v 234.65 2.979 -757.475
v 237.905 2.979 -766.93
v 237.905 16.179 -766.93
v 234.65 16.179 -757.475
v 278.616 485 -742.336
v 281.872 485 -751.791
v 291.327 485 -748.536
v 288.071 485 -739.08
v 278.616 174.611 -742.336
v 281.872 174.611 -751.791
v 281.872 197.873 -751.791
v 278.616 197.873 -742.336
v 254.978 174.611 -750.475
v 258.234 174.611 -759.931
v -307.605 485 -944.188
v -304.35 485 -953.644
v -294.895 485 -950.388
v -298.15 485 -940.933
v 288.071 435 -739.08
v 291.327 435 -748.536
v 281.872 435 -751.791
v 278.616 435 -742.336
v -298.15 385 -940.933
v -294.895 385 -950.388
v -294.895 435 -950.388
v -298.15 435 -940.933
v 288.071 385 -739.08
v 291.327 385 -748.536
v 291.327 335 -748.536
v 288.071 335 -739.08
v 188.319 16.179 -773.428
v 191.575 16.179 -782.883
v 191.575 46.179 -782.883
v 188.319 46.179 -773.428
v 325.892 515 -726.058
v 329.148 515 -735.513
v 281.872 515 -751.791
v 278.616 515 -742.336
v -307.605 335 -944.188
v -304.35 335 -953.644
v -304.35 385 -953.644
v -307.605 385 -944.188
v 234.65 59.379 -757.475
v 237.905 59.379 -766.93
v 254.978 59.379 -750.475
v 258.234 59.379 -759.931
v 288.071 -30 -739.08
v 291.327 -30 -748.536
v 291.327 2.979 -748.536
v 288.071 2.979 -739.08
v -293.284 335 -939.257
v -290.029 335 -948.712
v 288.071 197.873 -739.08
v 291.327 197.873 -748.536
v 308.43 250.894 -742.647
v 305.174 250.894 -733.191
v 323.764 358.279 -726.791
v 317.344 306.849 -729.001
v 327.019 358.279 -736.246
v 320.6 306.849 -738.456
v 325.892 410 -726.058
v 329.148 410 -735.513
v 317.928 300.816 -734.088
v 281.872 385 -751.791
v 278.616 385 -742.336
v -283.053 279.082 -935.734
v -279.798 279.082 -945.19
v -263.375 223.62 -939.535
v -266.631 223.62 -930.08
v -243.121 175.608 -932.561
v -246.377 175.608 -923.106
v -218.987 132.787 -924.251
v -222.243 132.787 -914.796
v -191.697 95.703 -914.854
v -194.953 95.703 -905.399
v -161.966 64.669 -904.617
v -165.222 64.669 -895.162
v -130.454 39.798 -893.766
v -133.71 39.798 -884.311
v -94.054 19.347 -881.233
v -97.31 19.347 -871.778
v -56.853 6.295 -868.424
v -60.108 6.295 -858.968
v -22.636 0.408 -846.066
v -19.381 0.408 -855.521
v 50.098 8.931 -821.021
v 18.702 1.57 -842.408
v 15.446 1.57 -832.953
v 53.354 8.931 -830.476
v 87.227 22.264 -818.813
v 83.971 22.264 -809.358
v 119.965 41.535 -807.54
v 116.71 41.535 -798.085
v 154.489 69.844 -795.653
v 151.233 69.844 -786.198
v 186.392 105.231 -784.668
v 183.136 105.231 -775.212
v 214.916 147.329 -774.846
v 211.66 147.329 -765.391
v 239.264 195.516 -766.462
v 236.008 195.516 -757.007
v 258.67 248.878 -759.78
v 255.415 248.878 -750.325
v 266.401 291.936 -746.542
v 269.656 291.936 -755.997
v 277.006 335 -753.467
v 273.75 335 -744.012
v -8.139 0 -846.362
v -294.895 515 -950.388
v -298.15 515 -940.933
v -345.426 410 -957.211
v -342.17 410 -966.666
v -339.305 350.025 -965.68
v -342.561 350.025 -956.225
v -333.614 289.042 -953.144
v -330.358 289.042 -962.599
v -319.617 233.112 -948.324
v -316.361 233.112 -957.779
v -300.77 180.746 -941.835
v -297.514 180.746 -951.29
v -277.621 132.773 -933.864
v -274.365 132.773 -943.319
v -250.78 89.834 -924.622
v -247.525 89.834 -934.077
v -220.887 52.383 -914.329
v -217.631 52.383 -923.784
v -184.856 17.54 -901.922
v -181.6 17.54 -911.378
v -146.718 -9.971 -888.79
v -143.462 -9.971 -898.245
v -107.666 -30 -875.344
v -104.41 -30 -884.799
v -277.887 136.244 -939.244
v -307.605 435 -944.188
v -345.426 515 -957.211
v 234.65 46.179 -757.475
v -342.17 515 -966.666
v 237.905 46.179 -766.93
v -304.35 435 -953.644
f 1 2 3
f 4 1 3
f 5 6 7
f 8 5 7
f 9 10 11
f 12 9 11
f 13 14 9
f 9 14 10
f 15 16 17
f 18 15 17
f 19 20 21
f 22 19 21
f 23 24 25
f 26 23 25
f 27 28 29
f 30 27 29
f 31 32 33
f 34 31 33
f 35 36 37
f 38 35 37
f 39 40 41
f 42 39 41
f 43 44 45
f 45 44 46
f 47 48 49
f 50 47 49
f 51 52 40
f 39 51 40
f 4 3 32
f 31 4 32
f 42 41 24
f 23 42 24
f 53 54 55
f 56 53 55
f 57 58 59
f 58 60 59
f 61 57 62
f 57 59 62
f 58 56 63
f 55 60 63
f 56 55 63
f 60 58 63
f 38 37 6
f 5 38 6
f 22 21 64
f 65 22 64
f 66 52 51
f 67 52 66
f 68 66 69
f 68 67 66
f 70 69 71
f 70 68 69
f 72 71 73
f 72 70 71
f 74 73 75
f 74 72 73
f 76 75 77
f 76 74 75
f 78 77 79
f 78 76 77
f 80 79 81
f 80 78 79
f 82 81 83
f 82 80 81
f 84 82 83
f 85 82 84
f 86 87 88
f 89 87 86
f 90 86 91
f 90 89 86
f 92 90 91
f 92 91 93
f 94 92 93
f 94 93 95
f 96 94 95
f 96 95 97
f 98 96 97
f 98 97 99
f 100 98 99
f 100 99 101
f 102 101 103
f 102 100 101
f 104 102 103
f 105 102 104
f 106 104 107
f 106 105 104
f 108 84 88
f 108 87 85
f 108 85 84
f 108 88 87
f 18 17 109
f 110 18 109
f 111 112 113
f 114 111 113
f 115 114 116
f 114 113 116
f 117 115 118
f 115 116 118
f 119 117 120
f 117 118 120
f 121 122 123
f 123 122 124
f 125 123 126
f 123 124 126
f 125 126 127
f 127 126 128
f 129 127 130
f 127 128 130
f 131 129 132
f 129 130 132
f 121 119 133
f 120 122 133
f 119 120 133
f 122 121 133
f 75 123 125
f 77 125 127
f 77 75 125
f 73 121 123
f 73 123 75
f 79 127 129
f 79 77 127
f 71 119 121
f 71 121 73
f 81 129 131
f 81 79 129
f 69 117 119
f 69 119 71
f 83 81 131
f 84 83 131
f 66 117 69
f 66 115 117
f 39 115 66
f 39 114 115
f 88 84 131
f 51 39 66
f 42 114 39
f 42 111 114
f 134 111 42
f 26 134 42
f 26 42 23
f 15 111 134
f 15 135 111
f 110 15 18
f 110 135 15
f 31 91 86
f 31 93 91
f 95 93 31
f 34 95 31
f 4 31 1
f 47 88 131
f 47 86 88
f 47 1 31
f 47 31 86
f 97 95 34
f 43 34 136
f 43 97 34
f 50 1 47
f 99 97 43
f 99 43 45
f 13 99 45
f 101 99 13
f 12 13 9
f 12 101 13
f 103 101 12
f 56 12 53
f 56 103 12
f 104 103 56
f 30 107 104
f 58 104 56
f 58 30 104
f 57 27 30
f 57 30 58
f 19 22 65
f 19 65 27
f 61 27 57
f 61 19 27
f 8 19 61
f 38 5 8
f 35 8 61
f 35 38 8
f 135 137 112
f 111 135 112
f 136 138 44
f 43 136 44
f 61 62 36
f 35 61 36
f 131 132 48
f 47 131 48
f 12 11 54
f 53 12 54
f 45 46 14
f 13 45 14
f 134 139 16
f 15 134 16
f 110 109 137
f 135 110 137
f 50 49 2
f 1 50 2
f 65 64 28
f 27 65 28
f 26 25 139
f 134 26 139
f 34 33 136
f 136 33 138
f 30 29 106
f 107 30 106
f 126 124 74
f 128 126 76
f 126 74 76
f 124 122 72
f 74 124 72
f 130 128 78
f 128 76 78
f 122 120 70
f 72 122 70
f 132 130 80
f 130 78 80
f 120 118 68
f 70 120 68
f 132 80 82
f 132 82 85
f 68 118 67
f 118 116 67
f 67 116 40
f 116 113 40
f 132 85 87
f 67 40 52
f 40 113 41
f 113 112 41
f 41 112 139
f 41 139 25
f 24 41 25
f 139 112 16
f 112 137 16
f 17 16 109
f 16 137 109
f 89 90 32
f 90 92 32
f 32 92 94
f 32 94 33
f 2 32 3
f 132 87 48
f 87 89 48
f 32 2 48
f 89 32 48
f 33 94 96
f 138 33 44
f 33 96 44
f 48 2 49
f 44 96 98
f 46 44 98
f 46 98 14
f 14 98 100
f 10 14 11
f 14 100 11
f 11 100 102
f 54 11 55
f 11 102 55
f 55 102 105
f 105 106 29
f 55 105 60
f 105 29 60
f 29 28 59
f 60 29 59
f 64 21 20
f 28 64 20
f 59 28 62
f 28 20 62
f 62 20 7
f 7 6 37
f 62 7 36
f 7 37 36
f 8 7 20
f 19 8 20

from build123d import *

# Parameters (mm, degrees)
BOSS_EXTRUDE1_DEPTH = 10


with BuildPart() as part:
    # Sketch4 → Boss-Extrude1 (new body)
    with BuildSketch(Plane(origin=(261.301378678, 0, -758.874306307), x_dir=(0.945518576, 0, 0.325568154), z_dir=(-0.325568154, 0, 0.945518576))):
        with BuildLine():
            Line((21.755705622, 515), (21.755705622, 485))
            Line((21.755705622, 485), (31.755705622, 485))
            Line((31.755705622, 485), (31.755705622, 435))
            Line((31.755705622, 435), (21.755705622, 435))
            Line((21.755705622, 435), (21.755705622, 385))
            Line((21.755705622, 385), (31.755705622, 385))
            Line((31.755705622, 385), (31.755705622, 335))
            Line((31.755705622, 335), (21.755705622, 335))
            Line((21.755705622, 335), (16.60929745, 335))
            add(Edge.make_bspline(
                [(-583.097886205, 335), (-536.728774067, 0), (-283.244294378, 0), (-29.759814689, 0), (16.60929745, 335)],
                knots=[4.896351675, 4.896351675, 4.896351675, 6.283185307, 6.283185307, 7.67001894, 7.67001894, 7.67001894], degree=2, weights=[1, 0.769066587, 1, 0.769066587, 1]))
            Line((-583.097886205, 335), (-588.244294378, 335))
            Line((-588.244294378, 335), (-598.244294378, 335))
            Line((-598.244294378, 335), (-598.244294378, 385))
            Line((-598.244294378, 385), (-588.244294378, 385))
            Line((-588.244294378, 385), (-588.244294378, 435))
            Line((-588.244294378, 435), (-598.244294378, 435))
            Line((-598.244294378, 435), (-598.244294378, 485))
            Line((-598.244294378, 485), (-588.244294378, 485))
            Line((-588.244294378, 485), (-588.244294378, 515))
            Line((-588.244294378, 515), (-638.244294378, 515))
            Line((-638.244294378, 515), (-638.244294378, 410))
            add(Edge.make_bspline(
                [(-638.244294378, 410), (-638.244294378, 69.353354952), (-386.783963771, -30)],
                knots=[1.570796327, 1.570796327, 1.570796327, 2.845629732, 2.845629732, 2.845629732], degree=2, weights=[1, 0.803635813, 1]))
            Line((-386.783963771, -30), (-179.704624985, -30))
            Line((-179.704624985, -30), (31.755705622, -30))
            Line((31.755705622, -30), (31.755705622, 2.978733327))
            Line((31.755705622, 2.978733327), (21.755705622, 2.978733327))
            Line((21.755705622, 2.978733327), (-3.244294378, 2.978733327))
            Line((-3.244294378, 2.978733327), (-24.744294378, 2.978733327))
            Line((-24.744294378, 2.978733327), (-24.744294378, 16.178733327))
            Line((-24.744294378, 16.178733327), (-73.744294378, 16.178733327))
            Line((-73.744294378, 16.178733327), (-73.744294378, 46.178733327))
            Line((-73.744294378, 46.178733327), (-24.744294378, 46.178733327))
            Line((-24.744294378, 46.178733327), (-24.744294378, 59.378733327))
            Line((-24.744294378, 59.378733327), (-3.244294378, 59.378733327))
            Line((-3.244294378, 59.378733327), (-3.244294378, 127.221118093))
            Line((-3.244294378, 127.221118093), (-3.244294378, 174.61084571))
            Line((-3.244294378, 174.61084571), (21.755705622, 174.61084571))
            Line((21.755705622, 174.61084571), (21.755705622, 197.872547884))
            Line((21.755705622, 197.872547884), (31.755705622, 197.872547884))
            add(Edge.make_bspline(
                [(31.755705622, 197.872547884), (71.755705622, 297.604111192), (71.755705622, 410)],
                knots=[4.233101976, 4.233101976, 4.233101976, 4.71238898, 4.71238898, 4.71238898], degree=2, weights=[1, 0.971422654, 1]))
            Line((71.755705622, 410), (71.755705622, 515))
            Line((71.755705622, 515), (21.755705622, 515))
        make_face()
    extrude(amount=BOSS_EXTRUDE1_DEPTH)


solid = part.part
